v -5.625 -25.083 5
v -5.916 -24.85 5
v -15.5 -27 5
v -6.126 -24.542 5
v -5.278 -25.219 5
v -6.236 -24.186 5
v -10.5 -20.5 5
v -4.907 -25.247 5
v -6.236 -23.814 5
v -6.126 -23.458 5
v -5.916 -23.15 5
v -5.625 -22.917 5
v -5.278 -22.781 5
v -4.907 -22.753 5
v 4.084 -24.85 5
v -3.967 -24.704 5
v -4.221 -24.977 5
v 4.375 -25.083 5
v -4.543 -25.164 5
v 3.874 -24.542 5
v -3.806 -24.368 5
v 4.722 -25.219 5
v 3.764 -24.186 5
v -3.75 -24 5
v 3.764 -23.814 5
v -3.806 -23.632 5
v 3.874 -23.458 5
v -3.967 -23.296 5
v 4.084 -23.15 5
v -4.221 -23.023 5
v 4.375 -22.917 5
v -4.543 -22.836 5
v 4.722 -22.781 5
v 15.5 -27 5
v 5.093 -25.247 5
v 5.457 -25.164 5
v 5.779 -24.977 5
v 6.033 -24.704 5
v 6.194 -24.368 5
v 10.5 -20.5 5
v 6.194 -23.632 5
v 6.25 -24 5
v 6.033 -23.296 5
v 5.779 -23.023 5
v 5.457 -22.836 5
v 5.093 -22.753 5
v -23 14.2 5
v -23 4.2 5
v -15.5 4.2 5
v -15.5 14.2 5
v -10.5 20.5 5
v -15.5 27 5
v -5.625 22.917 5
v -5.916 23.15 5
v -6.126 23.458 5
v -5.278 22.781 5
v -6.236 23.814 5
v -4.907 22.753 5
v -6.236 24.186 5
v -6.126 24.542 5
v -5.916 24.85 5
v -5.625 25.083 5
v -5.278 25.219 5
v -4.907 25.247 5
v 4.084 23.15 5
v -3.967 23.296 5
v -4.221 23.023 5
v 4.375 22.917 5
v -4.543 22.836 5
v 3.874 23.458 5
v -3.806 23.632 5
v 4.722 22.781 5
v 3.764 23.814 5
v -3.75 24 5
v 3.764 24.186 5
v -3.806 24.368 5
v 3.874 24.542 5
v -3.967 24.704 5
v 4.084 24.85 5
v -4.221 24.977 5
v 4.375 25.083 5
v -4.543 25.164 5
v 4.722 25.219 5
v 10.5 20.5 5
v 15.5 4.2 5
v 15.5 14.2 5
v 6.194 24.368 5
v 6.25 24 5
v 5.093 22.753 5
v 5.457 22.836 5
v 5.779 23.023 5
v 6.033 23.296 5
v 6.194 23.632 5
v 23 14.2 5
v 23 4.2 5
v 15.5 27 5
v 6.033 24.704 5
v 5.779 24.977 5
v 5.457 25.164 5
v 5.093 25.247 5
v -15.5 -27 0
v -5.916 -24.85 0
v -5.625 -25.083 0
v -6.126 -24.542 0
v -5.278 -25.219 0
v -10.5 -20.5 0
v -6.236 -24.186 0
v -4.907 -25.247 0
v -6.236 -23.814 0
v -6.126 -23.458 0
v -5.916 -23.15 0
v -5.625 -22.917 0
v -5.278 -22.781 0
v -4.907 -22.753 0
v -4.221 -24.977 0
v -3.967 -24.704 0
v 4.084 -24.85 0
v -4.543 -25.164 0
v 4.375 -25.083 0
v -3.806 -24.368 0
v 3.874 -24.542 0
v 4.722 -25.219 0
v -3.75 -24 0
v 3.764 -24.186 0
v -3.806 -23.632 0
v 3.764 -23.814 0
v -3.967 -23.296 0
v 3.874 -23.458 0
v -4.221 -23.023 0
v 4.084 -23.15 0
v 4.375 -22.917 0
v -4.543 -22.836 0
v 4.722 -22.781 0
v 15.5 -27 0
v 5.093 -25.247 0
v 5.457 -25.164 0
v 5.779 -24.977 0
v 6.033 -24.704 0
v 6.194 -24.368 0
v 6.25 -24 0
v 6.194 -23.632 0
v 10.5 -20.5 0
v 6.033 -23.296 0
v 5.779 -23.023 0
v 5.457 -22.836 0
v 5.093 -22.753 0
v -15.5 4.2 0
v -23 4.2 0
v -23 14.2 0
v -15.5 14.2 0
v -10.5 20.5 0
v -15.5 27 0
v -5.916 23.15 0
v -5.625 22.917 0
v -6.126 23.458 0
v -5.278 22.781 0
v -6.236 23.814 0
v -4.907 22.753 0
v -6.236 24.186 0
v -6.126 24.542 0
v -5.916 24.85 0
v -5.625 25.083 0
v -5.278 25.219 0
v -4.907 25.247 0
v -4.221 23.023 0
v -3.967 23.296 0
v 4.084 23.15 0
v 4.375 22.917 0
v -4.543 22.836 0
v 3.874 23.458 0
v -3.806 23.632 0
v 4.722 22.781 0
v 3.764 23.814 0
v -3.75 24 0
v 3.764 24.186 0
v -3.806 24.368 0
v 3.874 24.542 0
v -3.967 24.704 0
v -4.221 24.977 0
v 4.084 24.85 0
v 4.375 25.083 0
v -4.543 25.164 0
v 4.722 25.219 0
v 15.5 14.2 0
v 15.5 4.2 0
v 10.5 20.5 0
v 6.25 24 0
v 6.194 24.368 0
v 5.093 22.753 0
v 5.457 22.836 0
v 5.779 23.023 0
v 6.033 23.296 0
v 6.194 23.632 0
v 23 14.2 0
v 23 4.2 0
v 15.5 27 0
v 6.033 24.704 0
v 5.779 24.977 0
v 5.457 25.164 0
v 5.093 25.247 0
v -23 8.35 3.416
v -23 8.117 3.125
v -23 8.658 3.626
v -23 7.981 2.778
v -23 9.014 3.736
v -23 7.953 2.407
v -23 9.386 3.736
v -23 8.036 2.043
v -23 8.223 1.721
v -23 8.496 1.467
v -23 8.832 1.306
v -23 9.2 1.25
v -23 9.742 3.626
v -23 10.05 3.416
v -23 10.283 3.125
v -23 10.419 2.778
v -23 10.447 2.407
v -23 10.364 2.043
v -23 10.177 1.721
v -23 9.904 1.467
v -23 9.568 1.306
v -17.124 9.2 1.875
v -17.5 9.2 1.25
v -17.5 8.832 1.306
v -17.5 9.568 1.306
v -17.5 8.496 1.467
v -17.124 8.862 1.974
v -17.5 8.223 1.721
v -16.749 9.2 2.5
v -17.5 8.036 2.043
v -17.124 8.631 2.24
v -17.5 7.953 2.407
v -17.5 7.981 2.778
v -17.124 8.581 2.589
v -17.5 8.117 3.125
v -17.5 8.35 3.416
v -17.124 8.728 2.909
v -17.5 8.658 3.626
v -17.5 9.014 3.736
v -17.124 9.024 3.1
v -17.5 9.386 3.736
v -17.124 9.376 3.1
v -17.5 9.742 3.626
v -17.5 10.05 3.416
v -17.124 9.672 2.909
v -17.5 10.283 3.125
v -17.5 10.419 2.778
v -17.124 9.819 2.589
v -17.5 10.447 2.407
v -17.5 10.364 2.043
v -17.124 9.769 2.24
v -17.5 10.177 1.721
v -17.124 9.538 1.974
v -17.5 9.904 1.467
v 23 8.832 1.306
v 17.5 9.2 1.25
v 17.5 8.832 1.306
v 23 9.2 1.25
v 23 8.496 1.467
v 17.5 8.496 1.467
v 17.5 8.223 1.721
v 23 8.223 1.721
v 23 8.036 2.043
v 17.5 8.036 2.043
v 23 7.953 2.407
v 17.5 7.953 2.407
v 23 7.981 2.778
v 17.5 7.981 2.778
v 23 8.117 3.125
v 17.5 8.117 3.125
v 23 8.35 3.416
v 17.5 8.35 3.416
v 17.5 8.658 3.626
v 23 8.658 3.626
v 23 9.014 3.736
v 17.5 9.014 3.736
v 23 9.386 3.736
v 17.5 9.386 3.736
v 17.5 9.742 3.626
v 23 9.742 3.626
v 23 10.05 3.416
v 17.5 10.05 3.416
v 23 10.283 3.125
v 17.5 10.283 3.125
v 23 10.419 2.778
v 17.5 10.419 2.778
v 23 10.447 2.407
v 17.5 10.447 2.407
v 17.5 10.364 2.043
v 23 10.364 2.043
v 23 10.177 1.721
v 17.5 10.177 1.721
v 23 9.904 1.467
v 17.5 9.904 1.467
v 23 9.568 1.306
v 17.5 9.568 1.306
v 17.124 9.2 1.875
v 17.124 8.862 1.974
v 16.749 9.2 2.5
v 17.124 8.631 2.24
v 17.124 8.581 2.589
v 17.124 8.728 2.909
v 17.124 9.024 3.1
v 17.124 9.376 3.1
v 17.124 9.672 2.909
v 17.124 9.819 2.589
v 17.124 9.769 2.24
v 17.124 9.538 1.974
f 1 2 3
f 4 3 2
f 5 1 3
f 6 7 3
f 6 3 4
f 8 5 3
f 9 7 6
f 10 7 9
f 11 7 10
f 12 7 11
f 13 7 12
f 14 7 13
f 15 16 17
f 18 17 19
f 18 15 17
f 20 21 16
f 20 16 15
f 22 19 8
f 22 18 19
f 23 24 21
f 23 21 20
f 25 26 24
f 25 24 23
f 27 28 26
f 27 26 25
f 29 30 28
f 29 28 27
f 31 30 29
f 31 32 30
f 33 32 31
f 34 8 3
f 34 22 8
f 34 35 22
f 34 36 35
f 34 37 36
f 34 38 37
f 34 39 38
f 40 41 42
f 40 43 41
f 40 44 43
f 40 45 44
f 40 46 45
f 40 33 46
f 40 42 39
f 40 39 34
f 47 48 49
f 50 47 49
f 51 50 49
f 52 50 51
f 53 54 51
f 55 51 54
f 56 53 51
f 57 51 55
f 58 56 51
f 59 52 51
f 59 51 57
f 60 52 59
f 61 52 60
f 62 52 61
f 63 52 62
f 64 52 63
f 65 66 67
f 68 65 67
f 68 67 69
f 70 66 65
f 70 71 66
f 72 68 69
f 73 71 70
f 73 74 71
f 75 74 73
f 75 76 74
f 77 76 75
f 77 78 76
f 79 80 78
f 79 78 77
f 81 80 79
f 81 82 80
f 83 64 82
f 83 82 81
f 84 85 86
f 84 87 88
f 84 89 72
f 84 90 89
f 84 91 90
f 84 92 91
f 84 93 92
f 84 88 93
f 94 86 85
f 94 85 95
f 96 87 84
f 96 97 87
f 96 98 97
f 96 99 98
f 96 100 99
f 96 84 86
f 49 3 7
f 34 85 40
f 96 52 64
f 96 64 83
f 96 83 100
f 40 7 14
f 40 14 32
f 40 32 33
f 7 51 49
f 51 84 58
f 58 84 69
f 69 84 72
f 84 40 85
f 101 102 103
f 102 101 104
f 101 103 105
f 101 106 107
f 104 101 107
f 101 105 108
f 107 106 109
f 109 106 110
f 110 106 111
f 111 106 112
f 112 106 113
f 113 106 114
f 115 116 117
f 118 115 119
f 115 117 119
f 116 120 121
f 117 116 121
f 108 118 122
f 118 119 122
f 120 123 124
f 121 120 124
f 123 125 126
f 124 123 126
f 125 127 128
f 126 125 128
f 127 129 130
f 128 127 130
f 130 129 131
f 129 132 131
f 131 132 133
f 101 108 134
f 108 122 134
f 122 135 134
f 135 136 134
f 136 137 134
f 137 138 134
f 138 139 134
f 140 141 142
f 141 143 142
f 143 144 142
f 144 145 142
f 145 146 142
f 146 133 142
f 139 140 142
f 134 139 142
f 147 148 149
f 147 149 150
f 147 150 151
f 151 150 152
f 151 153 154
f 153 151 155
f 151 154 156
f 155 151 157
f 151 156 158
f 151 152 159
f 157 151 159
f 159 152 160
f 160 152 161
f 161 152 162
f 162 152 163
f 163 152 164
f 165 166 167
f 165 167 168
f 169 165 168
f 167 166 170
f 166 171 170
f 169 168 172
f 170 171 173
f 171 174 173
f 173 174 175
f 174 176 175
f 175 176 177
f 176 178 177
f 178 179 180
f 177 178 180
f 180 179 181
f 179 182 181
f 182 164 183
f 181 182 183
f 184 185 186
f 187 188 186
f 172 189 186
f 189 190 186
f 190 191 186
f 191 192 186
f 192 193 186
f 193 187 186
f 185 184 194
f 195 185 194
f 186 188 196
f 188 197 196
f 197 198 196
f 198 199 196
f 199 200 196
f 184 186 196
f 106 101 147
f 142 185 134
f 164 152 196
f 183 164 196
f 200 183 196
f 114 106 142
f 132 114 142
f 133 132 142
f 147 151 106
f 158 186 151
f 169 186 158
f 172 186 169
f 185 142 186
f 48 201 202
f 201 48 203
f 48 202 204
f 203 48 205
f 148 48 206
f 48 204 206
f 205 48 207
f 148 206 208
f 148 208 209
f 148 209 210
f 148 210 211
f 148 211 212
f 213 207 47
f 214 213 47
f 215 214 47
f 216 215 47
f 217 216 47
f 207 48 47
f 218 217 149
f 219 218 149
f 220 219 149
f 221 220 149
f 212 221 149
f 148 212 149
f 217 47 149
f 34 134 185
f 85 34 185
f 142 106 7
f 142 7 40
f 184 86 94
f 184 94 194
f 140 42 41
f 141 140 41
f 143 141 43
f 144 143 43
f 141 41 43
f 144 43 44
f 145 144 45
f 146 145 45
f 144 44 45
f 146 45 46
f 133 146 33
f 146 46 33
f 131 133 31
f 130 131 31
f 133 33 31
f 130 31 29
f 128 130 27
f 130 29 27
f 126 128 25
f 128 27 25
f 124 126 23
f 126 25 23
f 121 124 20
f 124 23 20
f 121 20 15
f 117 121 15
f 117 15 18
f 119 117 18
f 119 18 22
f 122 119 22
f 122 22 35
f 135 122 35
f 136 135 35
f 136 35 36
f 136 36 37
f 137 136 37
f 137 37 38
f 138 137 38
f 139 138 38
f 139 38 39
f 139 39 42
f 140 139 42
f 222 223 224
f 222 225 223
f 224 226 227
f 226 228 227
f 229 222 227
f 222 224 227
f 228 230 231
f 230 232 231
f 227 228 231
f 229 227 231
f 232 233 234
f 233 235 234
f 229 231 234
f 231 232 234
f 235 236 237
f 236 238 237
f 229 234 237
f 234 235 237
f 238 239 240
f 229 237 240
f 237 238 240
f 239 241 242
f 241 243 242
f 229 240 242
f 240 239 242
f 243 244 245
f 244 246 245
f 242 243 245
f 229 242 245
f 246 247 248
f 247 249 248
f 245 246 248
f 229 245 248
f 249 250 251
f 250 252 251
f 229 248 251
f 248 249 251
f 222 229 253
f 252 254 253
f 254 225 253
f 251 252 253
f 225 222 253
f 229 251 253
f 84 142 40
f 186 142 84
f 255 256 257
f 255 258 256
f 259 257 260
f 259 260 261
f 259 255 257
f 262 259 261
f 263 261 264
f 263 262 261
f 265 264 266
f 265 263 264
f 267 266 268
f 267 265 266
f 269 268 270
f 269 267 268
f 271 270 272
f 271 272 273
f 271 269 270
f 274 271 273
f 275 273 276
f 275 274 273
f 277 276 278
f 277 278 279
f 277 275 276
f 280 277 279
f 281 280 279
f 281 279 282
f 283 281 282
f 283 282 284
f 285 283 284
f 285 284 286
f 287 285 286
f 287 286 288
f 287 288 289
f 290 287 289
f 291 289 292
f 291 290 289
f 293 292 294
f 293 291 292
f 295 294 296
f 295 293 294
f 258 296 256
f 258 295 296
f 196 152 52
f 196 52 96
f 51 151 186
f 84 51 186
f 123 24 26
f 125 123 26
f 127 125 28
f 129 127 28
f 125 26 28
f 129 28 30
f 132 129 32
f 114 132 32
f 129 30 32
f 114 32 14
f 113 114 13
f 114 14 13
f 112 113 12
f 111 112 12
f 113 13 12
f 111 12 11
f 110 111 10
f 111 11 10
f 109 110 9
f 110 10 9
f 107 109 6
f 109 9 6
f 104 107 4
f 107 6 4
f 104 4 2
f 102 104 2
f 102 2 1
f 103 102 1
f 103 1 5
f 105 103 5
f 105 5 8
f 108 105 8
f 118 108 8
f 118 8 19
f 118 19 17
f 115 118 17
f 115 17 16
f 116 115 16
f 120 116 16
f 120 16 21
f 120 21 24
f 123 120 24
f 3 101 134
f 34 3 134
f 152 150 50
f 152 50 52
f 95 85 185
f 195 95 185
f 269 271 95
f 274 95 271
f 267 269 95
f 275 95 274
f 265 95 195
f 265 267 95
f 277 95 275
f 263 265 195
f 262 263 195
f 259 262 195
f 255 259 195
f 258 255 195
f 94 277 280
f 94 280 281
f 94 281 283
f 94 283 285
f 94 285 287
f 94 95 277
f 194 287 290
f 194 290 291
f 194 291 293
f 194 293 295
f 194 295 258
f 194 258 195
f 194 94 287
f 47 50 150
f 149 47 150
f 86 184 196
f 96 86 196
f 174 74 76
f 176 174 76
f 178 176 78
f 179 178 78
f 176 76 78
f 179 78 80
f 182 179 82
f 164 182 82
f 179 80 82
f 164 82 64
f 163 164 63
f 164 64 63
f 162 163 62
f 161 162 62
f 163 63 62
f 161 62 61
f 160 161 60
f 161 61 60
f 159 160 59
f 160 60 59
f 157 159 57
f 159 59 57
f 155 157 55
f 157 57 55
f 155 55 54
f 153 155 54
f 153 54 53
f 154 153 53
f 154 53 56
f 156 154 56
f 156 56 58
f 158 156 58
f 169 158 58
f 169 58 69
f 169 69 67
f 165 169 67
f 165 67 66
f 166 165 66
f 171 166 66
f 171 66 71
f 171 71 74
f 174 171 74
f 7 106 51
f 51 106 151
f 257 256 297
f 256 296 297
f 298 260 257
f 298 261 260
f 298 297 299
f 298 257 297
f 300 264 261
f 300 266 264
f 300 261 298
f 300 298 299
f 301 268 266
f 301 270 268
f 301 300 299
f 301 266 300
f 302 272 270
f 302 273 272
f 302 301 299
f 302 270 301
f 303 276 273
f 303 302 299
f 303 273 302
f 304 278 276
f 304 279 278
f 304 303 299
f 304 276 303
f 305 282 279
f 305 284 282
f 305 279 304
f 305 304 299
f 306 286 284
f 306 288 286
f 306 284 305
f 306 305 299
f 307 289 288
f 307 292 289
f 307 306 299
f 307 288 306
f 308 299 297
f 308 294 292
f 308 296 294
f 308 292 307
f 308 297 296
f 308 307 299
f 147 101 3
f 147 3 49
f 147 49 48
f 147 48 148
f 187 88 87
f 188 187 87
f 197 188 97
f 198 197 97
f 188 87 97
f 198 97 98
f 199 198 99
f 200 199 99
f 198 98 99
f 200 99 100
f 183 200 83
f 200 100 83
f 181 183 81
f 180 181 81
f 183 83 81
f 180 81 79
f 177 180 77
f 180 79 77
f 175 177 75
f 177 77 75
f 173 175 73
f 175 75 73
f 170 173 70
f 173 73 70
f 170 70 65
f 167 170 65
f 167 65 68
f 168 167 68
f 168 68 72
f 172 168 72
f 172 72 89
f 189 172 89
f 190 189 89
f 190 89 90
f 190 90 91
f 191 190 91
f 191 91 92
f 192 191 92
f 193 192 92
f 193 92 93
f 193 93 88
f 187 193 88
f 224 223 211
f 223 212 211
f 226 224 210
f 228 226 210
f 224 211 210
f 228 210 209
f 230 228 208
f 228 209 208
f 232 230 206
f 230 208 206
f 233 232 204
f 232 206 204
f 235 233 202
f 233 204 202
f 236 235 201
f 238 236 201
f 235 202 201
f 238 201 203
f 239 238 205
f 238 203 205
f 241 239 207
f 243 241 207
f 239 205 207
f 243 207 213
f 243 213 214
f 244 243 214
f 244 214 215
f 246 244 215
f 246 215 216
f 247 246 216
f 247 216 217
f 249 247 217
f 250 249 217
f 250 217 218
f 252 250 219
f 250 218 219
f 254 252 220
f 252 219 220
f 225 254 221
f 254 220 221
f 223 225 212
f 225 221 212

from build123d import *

# Parameters (mm, degrees)
SKETCH_1_W         = 31
SKETCH_1_H         = 54
SKETCH_1_W_2       = 21
SKETCH_1_H_2       = 41
EXTRUDE_1_DEPTH    = 5
SKETCH_2_W         = 5
SKETCH_2_H         = 10
EXTRUDE_2_DEPTH    = 7.5
HOLE_WIZARD_M3_1_D = 2.5


with BuildPart() as part:
    # 草图1 → 凸台-拉伸1 (new body)
    with BuildSketch(Plane.XY):
        Rectangle(SKETCH_1_W, SKETCH_1_H)
        Rectangle(SKETCH_1_W_2, SKETCH_1_H_2, mode=Mode.SUBTRACT)
    extrude(amount=EXTRUDE_1_DEPTH)

    # 草图2 → 凸台-拉伸2 (add)
    with BuildSketch(Plane(origin=(15.5, 0, 0), x_dir=(0, 0, -1), z_dir=(1, 0, 0))):
        with Locations((-2.5, 9.2)):
            Rectangle(SKETCH_2_W, SKETCH_2_H)
    extrude_2 = extrude(amount=EXTRUDE_2_DEPTH)

    # 镜向1: 凸台-拉伸2 across plane
    add(extrude_2.mirror(Plane(origin=(0, 0, 0), x_dir=(0, 0, 1), z_dir=(1, 0, 0))))

    # M3 螺纹孔1 (through all)
    with Locations(Plane(origin=(0, 0, 0), x_dir=(-1, 0, 0), z_dir=(0, 0, -1))):
        with Locations((-5, -24), (5, -24), (-5, 24), (5, 24)):
            Hole(HOLE_WIZARD_M3_1_D / 2)

    # 草图7 → M3 螺纹孔2 (revolve, cut)
    with BuildSketch(Plane(origin=(23, 9.2, 2.5), x_dir=(0, 0, -1), z_dir=(0, 1, 0))):
        Polygon((0, 0), (0, 6.251075774), (1.25, 5.5), (1.25, 0), align=None)
    hole_wizard_m3_2 = revolve(axis=Axis((29.35, 9.2, 2.5), (-1, 0, 0)), mode=Mode.SUBTRACT)

    # 镜向2: M3 螺纹孔2 across plane
    add(hole_wizard_m3_2.mirror(Plane(origin=(0, 0, 0), x_dir=(0, 0, 1), z_dir=(1, 0, 0))), mode=Mode.SUBTRACT)


solid = part.part
